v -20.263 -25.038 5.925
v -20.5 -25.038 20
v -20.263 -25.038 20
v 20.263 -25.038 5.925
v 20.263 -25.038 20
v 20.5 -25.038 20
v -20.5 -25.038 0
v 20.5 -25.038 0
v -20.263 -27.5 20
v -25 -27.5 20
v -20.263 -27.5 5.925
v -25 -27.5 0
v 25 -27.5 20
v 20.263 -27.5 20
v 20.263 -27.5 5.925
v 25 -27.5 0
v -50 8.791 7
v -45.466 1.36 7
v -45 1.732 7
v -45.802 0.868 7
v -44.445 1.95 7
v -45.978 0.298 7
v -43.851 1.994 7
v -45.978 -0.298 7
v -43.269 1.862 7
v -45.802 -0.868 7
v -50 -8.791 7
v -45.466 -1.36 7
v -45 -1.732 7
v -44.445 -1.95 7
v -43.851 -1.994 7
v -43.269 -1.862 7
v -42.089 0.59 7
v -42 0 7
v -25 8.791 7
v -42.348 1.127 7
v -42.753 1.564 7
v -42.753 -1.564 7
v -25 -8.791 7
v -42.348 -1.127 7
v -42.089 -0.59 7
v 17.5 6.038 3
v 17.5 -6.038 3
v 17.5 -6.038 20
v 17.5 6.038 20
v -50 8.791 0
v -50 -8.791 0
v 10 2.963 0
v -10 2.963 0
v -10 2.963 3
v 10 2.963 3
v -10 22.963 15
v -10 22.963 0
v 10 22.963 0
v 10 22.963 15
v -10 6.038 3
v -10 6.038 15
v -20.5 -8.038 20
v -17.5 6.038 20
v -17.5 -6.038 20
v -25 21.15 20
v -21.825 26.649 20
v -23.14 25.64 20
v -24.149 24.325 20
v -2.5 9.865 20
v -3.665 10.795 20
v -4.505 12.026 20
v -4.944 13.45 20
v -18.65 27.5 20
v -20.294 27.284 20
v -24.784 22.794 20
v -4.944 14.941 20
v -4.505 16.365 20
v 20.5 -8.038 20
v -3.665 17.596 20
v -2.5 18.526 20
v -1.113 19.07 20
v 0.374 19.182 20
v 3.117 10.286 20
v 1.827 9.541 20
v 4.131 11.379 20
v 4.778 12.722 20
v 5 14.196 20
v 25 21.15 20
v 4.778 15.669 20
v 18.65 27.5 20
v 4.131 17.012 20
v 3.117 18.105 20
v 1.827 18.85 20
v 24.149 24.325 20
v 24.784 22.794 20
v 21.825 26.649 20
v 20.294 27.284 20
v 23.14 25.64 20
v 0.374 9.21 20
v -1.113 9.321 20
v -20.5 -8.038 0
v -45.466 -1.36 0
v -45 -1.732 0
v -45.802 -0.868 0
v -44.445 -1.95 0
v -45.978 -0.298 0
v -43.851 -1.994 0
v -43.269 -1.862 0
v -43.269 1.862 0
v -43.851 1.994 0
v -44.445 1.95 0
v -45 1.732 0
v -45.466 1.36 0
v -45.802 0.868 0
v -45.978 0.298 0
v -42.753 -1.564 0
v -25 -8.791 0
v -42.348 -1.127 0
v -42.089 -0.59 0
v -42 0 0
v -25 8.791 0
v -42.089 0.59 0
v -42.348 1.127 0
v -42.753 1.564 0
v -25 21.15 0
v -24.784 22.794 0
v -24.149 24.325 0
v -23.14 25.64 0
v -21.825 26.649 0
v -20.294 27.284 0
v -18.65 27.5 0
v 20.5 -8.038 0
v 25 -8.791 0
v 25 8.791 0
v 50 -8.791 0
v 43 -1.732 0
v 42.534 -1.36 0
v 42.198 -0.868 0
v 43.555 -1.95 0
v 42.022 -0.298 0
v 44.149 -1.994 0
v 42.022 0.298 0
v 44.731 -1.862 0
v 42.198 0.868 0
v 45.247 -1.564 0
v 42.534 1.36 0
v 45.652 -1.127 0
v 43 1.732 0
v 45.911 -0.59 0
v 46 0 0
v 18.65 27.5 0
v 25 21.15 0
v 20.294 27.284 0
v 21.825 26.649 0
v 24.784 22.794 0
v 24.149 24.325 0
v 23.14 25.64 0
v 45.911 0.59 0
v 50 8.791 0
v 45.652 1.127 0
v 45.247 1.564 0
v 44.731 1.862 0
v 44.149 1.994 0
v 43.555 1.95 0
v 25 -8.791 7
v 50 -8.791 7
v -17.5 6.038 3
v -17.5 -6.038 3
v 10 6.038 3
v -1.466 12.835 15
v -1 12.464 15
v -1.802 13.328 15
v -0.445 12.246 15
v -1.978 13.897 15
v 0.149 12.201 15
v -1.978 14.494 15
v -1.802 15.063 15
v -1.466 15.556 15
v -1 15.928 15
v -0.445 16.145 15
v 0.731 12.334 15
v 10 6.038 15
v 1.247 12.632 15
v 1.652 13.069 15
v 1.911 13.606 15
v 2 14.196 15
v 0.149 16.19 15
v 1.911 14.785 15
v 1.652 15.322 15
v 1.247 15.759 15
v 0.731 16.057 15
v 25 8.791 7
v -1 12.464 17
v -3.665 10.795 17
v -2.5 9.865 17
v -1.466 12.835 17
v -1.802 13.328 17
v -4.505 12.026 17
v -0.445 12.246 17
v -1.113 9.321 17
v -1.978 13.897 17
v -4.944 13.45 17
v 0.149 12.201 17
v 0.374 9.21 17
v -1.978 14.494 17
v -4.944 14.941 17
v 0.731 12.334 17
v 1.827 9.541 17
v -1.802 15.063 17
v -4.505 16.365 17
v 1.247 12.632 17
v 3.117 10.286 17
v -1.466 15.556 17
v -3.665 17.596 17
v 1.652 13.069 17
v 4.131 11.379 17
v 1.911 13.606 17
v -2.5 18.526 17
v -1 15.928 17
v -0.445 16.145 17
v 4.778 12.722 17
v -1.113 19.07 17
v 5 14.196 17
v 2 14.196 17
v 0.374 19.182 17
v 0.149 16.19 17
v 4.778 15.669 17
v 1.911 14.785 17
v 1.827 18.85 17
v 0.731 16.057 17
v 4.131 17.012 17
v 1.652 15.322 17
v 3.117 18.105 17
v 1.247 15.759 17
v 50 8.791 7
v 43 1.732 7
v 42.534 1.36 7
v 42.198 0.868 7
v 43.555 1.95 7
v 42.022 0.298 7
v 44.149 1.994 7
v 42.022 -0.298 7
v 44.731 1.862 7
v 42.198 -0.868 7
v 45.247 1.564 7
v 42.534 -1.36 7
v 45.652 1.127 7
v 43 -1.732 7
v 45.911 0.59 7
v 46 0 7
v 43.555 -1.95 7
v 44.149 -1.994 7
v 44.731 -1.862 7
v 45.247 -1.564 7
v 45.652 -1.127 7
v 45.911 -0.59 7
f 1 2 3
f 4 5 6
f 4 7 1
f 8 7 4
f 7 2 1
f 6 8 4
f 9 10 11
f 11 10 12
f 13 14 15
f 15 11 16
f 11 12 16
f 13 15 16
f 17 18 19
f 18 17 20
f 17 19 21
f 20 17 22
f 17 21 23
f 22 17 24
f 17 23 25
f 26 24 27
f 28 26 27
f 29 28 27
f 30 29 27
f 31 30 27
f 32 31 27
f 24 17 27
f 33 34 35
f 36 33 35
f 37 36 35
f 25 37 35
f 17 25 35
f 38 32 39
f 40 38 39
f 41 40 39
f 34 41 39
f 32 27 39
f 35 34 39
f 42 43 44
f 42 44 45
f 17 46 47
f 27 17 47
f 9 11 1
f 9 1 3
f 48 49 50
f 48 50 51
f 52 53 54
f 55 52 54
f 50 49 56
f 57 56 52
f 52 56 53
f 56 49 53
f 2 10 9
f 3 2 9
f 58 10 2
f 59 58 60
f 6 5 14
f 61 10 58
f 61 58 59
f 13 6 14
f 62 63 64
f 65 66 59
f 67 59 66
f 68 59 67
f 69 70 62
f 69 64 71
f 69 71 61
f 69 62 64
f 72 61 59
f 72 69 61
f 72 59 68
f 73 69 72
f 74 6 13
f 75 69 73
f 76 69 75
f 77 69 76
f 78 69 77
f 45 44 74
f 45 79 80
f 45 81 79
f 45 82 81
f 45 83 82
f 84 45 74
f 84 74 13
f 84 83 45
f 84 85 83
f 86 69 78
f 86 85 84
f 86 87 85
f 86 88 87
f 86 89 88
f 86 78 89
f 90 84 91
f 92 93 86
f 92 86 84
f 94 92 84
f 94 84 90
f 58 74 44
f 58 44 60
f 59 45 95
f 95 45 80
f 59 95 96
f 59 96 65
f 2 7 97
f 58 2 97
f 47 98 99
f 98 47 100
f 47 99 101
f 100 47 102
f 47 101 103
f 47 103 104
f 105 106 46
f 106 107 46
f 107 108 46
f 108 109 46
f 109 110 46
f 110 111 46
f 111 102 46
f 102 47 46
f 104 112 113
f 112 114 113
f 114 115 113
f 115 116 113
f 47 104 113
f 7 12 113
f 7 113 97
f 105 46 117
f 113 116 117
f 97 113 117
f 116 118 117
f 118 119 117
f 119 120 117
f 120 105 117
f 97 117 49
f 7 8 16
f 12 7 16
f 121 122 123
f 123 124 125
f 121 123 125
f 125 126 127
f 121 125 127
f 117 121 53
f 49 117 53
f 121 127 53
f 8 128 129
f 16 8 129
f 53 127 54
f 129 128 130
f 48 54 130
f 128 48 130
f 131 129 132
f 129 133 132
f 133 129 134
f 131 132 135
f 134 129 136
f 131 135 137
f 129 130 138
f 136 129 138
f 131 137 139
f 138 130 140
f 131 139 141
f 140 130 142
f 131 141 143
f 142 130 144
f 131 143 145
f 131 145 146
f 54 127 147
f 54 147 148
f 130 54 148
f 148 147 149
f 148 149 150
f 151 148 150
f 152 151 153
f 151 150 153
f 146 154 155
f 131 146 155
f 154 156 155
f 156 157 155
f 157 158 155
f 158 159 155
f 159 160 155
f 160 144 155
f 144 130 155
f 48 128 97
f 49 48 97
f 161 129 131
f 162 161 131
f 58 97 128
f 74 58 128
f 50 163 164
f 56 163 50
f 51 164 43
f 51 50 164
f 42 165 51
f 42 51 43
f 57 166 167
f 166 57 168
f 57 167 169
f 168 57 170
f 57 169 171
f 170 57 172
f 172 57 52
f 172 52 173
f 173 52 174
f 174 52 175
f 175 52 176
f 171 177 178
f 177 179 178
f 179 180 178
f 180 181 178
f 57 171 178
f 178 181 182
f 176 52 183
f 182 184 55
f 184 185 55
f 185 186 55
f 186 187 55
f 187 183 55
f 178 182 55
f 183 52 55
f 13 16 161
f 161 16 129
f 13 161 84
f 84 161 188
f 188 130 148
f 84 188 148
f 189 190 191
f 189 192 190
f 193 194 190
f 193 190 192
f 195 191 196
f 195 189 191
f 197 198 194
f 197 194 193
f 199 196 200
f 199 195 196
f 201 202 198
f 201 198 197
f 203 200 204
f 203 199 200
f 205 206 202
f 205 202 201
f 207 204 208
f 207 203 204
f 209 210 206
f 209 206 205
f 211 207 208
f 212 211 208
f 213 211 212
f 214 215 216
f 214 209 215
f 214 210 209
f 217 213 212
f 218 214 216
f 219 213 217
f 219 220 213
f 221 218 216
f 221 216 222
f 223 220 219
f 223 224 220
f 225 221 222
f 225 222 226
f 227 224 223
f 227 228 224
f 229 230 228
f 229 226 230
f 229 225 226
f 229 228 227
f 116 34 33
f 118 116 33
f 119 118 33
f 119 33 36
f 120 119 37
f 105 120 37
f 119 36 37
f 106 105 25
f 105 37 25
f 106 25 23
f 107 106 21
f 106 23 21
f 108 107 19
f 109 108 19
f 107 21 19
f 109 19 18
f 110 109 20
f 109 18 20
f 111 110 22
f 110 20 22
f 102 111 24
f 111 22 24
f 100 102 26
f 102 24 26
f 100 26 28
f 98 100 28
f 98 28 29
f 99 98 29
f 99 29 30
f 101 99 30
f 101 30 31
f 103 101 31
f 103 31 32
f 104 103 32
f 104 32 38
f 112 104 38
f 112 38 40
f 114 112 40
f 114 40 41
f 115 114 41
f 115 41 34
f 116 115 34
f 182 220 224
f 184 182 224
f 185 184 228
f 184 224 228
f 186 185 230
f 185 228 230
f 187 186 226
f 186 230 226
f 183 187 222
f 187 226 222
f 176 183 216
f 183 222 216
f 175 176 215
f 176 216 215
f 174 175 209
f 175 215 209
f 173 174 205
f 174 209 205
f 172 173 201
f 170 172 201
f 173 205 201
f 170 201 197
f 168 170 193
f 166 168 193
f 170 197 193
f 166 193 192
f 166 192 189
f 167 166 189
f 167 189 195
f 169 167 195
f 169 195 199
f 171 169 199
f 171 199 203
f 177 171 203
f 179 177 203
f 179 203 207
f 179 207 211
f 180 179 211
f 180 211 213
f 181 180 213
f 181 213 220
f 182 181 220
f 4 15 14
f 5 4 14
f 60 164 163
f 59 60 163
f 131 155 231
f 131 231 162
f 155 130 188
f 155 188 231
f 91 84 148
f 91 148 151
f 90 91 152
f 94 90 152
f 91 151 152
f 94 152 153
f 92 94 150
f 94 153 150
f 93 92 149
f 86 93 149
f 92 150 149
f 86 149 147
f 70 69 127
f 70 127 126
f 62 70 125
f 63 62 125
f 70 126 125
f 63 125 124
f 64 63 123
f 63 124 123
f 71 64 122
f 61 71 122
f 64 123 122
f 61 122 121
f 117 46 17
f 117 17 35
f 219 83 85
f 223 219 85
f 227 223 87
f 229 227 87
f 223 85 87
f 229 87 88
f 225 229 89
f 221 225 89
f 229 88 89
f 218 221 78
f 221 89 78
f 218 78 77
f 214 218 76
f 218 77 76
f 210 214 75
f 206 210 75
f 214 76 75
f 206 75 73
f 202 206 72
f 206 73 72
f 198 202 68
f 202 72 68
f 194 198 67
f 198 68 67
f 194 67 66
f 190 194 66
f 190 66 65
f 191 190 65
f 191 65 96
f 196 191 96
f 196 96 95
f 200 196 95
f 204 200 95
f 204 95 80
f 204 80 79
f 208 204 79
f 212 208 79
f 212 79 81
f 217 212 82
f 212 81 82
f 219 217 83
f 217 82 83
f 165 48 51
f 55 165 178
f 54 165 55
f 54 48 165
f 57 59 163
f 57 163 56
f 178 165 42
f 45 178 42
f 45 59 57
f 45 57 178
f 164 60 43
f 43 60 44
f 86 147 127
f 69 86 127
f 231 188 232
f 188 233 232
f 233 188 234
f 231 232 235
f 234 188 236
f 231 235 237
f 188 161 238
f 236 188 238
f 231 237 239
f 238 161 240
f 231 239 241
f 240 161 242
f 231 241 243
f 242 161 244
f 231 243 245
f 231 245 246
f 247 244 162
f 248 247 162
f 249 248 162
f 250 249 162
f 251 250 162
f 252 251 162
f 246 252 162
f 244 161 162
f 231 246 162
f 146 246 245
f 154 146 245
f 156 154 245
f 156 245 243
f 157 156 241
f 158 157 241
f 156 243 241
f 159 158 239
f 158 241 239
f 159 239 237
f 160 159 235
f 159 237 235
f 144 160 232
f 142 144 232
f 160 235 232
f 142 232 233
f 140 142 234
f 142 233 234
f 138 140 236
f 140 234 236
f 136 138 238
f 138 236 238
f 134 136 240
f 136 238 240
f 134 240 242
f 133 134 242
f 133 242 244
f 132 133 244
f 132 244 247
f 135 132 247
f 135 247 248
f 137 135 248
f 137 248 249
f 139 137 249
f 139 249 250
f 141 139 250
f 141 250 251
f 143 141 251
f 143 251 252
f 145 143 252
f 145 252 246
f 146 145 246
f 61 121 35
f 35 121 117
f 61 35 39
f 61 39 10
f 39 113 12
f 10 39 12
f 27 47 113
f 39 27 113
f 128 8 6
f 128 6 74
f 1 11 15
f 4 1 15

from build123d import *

# Parameters (mm, degrees)
F0_W      = 41
F0_H      = 17
F0_W_2    = 20
F0_H_2    = 20
F1_DEPTH  = 20
F2_W      = 40.5264794827
F2_H      = 14.0749709308
F3_DEPTH  = 5
F4_W      = 25
F4_H      = 17.5813399255
F5_DEPTH  = 7
F6_W      = 20
F6_H      = 20
F7_DEPTH  = 5
F8_R      = 2
F9_DEPTH  = 10
F10_R     = 5
F11_DEPTH = 3
F12_W     = 35
F12_H     = 12.0767594278
F13_DEPTH = 17
F14_R     = 2
F15_DEPTH = 10


with BuildPart() as f1:
    # F0 (on Top) → F1 (new body)
    with BuildSketch(Plane.XY):
        with BuildLine():
            Line((-25, 21.15), (-25, -27.5))
            Line((-25, -27.5), (25, -27.5))
            Line((25, -27.5), (25, 21.15))
            ThreePointArc((25, 21.15), (23.1401280605, 25.6401280605), (18.65, 27.5))
            Line((18.65, 27.5), (-18.65, 27.5))
            ThreePointArc((-18.65, 27.5), (-23.1401280605, 25.6401280605), (-25, 21.15))
        make_face()
        with Locations((0, -16.5383797139)):
            Rectangle(F0_W, F0_H, mode=Mode.SUBTRACT)
        with Locations((0, 12.9625145346)):
            Rectangle(F0_W_2, F0_H_2, mode=Mode.SUBTRACT)
    extrude(amount=F1_DEPTH)

    # F2 (on face) → F3 (cut)
    with BuildSketch(Plane.XZ.offset(27.5)):
        with Locations((0, 12.9625145346)):
            Rectangle(F2_W, F2_H)
    extrude(amount=-F3_DEPTH, mode=Mode.SUBTRACT)

    # F4 (on face) → F5 (join)
    with BuildSketch(Plane(origin=(0, 0, 0), x_dir=(1, 0, 0), z_dir=(0, 0, -1))):
        with Locations((-37.5, 0)):
            Rectangle(F4_W, F4_H)
        with Locations((37.5, 0)):
            Rectangle(F4_W, F4_H)
    extrude(amount=-F5_DEPTH)

    # F6 (on face) → F7 (join)
    with BuildSketch(Plane.XY.offset(20)):
        with Locations((0, 12.9625145346)):
            Rectangle(F6_W, F6_H)
    extrude(amount=-F7_DEPTH)

    # F8 (on face) → F9 (cut)
    with BuildSketch(Plane.XY.offset(20)):
        with Locations((0, 14.1955753788)):
            Circle(F8_R)
    extrude(amount=-F9_DEPTH, mode=Mode.SUBTRACT)

    # F10 (on face) → F11 (cut)
    with BuildSketch(Plane.XY.offset(20)):
        with Locations((0, 14.1955753788)):
            Circle(F10_R)
    extrude(amount=-F11_DEPTH, mode=Mode.SUBTRACT)

    # F12 (on face) → F13 (cut)
    with BuildSketch(Plane.XY.offset(20)):
        Rectangle(F12_W, F12_H)
    extrude(amount=-F13_DEPTH, mode=Mode.SUBTRACT)

    # F14 (on face) → F15 (cut)
    with BuildSketch(Plane.XY.offset(7)):
        with Locations((-44, 0)):
            Circle(F14_R)
        with Locations((44, 0)):
            Circle(F14_R)
    extrude(amount=-F15_DEPTH, mode=Mode.SUBTRACT)


solid = f1.part
